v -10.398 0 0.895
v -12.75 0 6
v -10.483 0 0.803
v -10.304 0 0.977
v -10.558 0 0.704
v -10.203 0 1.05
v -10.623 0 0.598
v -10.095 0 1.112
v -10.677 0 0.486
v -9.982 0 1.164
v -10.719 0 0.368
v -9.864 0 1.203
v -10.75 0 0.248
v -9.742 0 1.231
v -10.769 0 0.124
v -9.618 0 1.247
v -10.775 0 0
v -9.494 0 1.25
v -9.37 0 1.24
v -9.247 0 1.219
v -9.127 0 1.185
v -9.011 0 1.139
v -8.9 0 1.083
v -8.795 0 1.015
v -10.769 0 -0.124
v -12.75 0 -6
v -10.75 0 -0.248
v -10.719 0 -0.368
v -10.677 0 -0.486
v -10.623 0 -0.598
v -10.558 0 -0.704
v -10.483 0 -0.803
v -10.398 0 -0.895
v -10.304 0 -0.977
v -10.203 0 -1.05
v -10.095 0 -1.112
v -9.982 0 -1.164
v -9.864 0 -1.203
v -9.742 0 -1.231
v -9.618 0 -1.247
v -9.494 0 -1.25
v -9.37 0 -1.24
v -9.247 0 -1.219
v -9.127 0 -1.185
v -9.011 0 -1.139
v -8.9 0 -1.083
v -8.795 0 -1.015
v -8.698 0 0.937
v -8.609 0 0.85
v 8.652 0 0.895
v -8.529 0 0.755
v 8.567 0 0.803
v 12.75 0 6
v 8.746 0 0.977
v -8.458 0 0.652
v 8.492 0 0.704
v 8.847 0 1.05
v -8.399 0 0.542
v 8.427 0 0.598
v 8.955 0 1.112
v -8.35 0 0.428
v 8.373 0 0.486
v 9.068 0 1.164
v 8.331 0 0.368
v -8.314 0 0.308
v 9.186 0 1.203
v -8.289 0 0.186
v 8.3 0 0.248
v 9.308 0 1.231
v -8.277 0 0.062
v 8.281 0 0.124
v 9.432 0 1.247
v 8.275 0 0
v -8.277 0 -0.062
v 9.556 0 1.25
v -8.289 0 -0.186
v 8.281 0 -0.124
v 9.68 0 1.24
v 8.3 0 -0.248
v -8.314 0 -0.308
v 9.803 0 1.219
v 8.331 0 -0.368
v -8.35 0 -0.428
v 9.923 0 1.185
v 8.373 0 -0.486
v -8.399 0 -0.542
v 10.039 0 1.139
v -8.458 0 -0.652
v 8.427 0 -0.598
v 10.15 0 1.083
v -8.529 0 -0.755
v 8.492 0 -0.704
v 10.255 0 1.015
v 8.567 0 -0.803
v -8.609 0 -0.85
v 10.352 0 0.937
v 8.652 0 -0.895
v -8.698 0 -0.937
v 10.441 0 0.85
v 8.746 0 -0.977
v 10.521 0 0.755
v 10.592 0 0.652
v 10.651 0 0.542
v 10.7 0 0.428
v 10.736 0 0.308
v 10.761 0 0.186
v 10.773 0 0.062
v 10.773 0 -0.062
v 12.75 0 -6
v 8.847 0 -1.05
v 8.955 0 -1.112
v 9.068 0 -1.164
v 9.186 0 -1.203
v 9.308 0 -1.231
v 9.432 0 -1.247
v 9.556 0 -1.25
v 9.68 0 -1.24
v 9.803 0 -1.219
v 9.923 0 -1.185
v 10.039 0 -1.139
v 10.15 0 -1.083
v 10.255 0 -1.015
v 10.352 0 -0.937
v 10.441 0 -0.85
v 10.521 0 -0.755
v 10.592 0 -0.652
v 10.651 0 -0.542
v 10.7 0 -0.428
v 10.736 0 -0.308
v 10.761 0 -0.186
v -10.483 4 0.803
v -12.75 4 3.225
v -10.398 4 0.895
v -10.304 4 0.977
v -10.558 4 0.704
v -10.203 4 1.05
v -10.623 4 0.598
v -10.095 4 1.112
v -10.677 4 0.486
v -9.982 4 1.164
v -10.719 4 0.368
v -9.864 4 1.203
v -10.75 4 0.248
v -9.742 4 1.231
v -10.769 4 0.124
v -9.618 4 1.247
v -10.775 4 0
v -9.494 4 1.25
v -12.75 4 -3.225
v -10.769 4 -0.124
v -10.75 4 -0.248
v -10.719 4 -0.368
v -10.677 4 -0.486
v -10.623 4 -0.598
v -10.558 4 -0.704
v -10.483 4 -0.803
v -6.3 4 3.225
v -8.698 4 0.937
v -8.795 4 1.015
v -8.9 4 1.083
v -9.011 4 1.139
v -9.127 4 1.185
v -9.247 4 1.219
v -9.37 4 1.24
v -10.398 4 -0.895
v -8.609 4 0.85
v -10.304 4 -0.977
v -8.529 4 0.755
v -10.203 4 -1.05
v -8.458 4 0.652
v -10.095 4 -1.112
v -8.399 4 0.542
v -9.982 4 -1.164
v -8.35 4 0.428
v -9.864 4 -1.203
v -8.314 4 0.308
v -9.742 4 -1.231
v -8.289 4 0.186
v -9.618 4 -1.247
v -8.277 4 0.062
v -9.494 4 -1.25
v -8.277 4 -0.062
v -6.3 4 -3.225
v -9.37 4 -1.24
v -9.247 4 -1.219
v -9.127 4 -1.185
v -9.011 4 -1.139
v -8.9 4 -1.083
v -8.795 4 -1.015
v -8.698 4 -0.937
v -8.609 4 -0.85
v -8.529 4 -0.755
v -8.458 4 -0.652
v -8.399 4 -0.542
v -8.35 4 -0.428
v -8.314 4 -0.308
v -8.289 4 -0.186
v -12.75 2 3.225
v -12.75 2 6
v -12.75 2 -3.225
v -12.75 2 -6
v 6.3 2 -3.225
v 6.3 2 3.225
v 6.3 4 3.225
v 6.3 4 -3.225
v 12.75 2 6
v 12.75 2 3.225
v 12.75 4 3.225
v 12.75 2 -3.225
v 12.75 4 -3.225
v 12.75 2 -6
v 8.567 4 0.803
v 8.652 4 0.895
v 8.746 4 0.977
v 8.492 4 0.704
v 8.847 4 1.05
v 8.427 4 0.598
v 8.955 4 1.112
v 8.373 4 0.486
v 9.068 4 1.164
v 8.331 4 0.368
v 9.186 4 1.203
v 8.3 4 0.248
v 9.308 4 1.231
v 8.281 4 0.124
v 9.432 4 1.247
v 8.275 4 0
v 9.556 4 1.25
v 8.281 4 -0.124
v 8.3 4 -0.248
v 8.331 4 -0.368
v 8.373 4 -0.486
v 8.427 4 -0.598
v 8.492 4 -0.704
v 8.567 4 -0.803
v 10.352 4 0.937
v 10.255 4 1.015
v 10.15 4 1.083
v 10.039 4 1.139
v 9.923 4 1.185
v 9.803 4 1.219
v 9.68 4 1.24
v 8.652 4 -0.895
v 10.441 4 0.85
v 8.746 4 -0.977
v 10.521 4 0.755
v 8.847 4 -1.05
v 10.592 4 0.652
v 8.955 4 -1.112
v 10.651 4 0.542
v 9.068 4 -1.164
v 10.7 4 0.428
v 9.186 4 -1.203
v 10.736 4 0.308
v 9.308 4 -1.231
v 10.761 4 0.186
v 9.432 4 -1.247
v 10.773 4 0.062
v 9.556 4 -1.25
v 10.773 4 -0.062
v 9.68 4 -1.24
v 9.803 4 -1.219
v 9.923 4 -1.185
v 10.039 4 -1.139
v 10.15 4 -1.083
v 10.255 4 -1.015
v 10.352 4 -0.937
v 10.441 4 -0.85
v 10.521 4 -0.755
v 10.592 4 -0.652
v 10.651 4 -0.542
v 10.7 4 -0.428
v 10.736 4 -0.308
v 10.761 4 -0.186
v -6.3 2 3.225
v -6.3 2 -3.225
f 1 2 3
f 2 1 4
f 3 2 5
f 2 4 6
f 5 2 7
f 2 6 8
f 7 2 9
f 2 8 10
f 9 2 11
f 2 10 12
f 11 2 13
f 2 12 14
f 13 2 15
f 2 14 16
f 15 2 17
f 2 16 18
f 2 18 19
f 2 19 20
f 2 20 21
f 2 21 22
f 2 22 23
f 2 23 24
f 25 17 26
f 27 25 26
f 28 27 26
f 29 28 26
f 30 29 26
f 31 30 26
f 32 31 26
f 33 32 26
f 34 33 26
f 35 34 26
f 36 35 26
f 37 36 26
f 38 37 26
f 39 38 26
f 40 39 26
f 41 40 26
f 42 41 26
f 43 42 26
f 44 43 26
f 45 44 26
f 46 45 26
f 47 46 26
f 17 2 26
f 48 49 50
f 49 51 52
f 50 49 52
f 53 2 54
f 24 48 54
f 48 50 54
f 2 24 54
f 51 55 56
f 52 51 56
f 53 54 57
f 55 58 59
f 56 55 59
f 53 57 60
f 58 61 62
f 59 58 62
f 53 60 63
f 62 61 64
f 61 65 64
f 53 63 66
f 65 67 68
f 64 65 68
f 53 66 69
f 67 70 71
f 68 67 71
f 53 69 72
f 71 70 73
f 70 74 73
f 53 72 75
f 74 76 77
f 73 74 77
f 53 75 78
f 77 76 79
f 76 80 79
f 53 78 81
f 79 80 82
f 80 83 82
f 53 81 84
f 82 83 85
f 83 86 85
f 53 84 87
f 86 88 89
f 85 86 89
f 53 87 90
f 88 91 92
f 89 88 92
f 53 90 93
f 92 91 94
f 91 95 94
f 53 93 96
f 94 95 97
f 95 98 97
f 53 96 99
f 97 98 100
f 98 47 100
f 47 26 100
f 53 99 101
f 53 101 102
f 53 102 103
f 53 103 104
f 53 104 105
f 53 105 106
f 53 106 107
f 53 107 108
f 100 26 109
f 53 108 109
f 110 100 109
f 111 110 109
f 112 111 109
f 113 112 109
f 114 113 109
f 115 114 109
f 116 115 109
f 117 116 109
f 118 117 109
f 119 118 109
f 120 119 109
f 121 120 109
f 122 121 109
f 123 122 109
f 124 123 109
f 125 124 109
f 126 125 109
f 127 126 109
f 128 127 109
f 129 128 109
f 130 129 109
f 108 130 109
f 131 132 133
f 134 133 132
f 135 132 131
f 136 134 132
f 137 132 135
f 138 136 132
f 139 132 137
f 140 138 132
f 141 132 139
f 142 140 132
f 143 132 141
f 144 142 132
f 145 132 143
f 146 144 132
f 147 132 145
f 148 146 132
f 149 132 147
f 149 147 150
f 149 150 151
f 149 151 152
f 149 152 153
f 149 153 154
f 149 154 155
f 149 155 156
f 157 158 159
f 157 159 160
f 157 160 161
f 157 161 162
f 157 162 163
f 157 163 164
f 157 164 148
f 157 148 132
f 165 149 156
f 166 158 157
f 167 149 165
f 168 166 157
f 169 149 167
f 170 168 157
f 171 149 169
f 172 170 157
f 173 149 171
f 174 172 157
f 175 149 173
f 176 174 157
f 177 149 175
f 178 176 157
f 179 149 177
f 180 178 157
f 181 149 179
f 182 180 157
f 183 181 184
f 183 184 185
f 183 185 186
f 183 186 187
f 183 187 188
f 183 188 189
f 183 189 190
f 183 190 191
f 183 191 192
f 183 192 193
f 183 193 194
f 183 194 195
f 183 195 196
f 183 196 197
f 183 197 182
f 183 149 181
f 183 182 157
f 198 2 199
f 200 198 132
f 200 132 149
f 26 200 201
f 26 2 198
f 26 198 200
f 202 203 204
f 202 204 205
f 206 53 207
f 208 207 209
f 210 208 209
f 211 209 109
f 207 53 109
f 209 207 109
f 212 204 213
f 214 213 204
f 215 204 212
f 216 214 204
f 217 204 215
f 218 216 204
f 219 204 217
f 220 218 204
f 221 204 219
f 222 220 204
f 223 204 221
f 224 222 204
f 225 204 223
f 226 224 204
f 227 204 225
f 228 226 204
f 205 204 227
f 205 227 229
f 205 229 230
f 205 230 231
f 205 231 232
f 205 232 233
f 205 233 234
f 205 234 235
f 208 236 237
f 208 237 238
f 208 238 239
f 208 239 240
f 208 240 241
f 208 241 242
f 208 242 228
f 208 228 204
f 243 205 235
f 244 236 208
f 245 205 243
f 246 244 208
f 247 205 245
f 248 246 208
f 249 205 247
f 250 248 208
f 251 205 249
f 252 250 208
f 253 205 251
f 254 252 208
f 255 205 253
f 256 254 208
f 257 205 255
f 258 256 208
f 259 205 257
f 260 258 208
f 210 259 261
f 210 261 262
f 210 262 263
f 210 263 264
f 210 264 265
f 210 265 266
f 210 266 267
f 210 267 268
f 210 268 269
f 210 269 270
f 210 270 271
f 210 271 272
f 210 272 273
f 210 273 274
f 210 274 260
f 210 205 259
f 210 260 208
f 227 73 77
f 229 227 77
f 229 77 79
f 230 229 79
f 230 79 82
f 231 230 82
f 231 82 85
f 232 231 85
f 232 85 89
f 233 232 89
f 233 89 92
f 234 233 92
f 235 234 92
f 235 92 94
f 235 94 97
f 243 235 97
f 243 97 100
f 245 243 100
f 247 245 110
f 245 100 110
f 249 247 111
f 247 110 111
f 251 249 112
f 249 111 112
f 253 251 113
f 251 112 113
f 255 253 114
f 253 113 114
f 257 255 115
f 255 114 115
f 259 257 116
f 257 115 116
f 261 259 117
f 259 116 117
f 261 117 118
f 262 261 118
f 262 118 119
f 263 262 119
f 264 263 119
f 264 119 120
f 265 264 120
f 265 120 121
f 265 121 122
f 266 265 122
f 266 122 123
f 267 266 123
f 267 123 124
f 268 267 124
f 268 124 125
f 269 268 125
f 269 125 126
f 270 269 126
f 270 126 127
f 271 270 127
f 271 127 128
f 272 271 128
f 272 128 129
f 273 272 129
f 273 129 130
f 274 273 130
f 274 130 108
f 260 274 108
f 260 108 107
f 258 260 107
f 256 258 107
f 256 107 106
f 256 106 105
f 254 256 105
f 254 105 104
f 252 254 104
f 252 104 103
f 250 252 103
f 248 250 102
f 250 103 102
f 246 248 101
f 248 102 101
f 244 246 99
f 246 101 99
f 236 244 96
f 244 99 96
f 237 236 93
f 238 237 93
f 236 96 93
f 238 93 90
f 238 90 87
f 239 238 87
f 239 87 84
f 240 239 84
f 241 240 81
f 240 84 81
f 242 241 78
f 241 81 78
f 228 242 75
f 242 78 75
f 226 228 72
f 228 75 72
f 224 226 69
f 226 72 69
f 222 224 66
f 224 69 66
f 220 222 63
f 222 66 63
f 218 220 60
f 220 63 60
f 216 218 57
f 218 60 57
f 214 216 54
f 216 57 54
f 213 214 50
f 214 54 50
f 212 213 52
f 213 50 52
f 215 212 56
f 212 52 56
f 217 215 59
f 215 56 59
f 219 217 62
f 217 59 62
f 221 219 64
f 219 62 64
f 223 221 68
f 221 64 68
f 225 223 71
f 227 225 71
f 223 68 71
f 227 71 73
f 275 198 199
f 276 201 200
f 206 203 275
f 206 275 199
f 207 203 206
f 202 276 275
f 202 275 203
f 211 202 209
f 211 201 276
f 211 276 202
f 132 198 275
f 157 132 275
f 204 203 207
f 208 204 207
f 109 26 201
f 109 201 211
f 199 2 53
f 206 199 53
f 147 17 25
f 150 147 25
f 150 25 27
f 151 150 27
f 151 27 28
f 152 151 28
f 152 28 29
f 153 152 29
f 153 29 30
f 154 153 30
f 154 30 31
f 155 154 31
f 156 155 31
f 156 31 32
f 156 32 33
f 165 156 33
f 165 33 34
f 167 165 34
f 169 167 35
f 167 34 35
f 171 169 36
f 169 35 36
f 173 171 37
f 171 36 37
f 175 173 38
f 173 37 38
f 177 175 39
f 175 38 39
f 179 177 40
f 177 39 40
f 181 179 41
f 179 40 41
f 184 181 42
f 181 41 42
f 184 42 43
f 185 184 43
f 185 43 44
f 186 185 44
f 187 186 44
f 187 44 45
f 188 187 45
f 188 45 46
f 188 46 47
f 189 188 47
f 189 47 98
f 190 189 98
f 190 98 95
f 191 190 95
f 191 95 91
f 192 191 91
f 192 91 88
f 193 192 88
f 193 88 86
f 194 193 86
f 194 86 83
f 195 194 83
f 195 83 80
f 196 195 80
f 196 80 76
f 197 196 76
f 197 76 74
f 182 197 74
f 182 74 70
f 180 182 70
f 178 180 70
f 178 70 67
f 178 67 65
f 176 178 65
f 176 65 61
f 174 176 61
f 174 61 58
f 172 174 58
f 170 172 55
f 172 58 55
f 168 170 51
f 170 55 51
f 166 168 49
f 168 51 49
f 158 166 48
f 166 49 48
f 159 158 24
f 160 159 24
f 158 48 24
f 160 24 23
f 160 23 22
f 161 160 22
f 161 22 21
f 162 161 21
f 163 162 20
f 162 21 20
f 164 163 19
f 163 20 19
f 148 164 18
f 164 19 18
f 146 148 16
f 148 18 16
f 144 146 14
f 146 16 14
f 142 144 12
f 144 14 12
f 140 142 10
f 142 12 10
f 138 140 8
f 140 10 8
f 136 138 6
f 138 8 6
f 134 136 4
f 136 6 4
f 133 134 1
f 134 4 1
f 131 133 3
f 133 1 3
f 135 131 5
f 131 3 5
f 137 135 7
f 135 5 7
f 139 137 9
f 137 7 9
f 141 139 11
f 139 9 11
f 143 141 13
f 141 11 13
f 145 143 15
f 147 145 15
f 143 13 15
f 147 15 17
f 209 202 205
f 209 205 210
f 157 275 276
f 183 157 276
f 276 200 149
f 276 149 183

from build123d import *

# Parameters (mm, degrees)
SKETCH2_W             = 25.5
SKETCH2_H             = 12
BOSS_EXTRUDE1_DEPTH   = 2
SKETCH3_W             = 6.45
SKETCH3_H             = 6.45
BOSS_EXTRUDE2_DEPTH   = 2
M3X0_5_TAPPED_HOLE1_D = 2.5


with BuildPart() as part:
    # Sketch2 → Boss-Extrude1 (new body)
    with BuildSketch(Plane(origin=(0, 0, 0), x_dir=(1, 0, 0), z_dir=(0, 1, 0))):
        Rectangle(SKETCH2_W, SKETCH2_H)
    extrude(amount=BOSS_EXTRUDE1_DEPTH)

    # Sketch3 → Boss-Extrude2 (add)
    with BuildSketch(Plane(origin=(0, 2, 0), x_dir=(1, 0, 0), z_dir=(0, 1, 0))):
        with Locations((-9.525, 0)):
            Rectangle(SKETCH3_W, SKETCH3_H)
        with Locations((9.525, 0)):
            Rectangle(SKETCH3_W, SKETCH3_H)
    extrude(amount=BOSS_EXTRUDE2_DEPTH)

    # M3x0.5 Tapped Hole1 (through all)
    with Locations(Plane(origin=(0, 4, 0), x_dir=(1, 0, 0), z_dir=(0, 1, 0))):
        with Locations((-9.525, 0), (9.525, 0)):
            Hole(M3X0_5_TAPPED_HOLE1_D / 2)


solid = part.part
